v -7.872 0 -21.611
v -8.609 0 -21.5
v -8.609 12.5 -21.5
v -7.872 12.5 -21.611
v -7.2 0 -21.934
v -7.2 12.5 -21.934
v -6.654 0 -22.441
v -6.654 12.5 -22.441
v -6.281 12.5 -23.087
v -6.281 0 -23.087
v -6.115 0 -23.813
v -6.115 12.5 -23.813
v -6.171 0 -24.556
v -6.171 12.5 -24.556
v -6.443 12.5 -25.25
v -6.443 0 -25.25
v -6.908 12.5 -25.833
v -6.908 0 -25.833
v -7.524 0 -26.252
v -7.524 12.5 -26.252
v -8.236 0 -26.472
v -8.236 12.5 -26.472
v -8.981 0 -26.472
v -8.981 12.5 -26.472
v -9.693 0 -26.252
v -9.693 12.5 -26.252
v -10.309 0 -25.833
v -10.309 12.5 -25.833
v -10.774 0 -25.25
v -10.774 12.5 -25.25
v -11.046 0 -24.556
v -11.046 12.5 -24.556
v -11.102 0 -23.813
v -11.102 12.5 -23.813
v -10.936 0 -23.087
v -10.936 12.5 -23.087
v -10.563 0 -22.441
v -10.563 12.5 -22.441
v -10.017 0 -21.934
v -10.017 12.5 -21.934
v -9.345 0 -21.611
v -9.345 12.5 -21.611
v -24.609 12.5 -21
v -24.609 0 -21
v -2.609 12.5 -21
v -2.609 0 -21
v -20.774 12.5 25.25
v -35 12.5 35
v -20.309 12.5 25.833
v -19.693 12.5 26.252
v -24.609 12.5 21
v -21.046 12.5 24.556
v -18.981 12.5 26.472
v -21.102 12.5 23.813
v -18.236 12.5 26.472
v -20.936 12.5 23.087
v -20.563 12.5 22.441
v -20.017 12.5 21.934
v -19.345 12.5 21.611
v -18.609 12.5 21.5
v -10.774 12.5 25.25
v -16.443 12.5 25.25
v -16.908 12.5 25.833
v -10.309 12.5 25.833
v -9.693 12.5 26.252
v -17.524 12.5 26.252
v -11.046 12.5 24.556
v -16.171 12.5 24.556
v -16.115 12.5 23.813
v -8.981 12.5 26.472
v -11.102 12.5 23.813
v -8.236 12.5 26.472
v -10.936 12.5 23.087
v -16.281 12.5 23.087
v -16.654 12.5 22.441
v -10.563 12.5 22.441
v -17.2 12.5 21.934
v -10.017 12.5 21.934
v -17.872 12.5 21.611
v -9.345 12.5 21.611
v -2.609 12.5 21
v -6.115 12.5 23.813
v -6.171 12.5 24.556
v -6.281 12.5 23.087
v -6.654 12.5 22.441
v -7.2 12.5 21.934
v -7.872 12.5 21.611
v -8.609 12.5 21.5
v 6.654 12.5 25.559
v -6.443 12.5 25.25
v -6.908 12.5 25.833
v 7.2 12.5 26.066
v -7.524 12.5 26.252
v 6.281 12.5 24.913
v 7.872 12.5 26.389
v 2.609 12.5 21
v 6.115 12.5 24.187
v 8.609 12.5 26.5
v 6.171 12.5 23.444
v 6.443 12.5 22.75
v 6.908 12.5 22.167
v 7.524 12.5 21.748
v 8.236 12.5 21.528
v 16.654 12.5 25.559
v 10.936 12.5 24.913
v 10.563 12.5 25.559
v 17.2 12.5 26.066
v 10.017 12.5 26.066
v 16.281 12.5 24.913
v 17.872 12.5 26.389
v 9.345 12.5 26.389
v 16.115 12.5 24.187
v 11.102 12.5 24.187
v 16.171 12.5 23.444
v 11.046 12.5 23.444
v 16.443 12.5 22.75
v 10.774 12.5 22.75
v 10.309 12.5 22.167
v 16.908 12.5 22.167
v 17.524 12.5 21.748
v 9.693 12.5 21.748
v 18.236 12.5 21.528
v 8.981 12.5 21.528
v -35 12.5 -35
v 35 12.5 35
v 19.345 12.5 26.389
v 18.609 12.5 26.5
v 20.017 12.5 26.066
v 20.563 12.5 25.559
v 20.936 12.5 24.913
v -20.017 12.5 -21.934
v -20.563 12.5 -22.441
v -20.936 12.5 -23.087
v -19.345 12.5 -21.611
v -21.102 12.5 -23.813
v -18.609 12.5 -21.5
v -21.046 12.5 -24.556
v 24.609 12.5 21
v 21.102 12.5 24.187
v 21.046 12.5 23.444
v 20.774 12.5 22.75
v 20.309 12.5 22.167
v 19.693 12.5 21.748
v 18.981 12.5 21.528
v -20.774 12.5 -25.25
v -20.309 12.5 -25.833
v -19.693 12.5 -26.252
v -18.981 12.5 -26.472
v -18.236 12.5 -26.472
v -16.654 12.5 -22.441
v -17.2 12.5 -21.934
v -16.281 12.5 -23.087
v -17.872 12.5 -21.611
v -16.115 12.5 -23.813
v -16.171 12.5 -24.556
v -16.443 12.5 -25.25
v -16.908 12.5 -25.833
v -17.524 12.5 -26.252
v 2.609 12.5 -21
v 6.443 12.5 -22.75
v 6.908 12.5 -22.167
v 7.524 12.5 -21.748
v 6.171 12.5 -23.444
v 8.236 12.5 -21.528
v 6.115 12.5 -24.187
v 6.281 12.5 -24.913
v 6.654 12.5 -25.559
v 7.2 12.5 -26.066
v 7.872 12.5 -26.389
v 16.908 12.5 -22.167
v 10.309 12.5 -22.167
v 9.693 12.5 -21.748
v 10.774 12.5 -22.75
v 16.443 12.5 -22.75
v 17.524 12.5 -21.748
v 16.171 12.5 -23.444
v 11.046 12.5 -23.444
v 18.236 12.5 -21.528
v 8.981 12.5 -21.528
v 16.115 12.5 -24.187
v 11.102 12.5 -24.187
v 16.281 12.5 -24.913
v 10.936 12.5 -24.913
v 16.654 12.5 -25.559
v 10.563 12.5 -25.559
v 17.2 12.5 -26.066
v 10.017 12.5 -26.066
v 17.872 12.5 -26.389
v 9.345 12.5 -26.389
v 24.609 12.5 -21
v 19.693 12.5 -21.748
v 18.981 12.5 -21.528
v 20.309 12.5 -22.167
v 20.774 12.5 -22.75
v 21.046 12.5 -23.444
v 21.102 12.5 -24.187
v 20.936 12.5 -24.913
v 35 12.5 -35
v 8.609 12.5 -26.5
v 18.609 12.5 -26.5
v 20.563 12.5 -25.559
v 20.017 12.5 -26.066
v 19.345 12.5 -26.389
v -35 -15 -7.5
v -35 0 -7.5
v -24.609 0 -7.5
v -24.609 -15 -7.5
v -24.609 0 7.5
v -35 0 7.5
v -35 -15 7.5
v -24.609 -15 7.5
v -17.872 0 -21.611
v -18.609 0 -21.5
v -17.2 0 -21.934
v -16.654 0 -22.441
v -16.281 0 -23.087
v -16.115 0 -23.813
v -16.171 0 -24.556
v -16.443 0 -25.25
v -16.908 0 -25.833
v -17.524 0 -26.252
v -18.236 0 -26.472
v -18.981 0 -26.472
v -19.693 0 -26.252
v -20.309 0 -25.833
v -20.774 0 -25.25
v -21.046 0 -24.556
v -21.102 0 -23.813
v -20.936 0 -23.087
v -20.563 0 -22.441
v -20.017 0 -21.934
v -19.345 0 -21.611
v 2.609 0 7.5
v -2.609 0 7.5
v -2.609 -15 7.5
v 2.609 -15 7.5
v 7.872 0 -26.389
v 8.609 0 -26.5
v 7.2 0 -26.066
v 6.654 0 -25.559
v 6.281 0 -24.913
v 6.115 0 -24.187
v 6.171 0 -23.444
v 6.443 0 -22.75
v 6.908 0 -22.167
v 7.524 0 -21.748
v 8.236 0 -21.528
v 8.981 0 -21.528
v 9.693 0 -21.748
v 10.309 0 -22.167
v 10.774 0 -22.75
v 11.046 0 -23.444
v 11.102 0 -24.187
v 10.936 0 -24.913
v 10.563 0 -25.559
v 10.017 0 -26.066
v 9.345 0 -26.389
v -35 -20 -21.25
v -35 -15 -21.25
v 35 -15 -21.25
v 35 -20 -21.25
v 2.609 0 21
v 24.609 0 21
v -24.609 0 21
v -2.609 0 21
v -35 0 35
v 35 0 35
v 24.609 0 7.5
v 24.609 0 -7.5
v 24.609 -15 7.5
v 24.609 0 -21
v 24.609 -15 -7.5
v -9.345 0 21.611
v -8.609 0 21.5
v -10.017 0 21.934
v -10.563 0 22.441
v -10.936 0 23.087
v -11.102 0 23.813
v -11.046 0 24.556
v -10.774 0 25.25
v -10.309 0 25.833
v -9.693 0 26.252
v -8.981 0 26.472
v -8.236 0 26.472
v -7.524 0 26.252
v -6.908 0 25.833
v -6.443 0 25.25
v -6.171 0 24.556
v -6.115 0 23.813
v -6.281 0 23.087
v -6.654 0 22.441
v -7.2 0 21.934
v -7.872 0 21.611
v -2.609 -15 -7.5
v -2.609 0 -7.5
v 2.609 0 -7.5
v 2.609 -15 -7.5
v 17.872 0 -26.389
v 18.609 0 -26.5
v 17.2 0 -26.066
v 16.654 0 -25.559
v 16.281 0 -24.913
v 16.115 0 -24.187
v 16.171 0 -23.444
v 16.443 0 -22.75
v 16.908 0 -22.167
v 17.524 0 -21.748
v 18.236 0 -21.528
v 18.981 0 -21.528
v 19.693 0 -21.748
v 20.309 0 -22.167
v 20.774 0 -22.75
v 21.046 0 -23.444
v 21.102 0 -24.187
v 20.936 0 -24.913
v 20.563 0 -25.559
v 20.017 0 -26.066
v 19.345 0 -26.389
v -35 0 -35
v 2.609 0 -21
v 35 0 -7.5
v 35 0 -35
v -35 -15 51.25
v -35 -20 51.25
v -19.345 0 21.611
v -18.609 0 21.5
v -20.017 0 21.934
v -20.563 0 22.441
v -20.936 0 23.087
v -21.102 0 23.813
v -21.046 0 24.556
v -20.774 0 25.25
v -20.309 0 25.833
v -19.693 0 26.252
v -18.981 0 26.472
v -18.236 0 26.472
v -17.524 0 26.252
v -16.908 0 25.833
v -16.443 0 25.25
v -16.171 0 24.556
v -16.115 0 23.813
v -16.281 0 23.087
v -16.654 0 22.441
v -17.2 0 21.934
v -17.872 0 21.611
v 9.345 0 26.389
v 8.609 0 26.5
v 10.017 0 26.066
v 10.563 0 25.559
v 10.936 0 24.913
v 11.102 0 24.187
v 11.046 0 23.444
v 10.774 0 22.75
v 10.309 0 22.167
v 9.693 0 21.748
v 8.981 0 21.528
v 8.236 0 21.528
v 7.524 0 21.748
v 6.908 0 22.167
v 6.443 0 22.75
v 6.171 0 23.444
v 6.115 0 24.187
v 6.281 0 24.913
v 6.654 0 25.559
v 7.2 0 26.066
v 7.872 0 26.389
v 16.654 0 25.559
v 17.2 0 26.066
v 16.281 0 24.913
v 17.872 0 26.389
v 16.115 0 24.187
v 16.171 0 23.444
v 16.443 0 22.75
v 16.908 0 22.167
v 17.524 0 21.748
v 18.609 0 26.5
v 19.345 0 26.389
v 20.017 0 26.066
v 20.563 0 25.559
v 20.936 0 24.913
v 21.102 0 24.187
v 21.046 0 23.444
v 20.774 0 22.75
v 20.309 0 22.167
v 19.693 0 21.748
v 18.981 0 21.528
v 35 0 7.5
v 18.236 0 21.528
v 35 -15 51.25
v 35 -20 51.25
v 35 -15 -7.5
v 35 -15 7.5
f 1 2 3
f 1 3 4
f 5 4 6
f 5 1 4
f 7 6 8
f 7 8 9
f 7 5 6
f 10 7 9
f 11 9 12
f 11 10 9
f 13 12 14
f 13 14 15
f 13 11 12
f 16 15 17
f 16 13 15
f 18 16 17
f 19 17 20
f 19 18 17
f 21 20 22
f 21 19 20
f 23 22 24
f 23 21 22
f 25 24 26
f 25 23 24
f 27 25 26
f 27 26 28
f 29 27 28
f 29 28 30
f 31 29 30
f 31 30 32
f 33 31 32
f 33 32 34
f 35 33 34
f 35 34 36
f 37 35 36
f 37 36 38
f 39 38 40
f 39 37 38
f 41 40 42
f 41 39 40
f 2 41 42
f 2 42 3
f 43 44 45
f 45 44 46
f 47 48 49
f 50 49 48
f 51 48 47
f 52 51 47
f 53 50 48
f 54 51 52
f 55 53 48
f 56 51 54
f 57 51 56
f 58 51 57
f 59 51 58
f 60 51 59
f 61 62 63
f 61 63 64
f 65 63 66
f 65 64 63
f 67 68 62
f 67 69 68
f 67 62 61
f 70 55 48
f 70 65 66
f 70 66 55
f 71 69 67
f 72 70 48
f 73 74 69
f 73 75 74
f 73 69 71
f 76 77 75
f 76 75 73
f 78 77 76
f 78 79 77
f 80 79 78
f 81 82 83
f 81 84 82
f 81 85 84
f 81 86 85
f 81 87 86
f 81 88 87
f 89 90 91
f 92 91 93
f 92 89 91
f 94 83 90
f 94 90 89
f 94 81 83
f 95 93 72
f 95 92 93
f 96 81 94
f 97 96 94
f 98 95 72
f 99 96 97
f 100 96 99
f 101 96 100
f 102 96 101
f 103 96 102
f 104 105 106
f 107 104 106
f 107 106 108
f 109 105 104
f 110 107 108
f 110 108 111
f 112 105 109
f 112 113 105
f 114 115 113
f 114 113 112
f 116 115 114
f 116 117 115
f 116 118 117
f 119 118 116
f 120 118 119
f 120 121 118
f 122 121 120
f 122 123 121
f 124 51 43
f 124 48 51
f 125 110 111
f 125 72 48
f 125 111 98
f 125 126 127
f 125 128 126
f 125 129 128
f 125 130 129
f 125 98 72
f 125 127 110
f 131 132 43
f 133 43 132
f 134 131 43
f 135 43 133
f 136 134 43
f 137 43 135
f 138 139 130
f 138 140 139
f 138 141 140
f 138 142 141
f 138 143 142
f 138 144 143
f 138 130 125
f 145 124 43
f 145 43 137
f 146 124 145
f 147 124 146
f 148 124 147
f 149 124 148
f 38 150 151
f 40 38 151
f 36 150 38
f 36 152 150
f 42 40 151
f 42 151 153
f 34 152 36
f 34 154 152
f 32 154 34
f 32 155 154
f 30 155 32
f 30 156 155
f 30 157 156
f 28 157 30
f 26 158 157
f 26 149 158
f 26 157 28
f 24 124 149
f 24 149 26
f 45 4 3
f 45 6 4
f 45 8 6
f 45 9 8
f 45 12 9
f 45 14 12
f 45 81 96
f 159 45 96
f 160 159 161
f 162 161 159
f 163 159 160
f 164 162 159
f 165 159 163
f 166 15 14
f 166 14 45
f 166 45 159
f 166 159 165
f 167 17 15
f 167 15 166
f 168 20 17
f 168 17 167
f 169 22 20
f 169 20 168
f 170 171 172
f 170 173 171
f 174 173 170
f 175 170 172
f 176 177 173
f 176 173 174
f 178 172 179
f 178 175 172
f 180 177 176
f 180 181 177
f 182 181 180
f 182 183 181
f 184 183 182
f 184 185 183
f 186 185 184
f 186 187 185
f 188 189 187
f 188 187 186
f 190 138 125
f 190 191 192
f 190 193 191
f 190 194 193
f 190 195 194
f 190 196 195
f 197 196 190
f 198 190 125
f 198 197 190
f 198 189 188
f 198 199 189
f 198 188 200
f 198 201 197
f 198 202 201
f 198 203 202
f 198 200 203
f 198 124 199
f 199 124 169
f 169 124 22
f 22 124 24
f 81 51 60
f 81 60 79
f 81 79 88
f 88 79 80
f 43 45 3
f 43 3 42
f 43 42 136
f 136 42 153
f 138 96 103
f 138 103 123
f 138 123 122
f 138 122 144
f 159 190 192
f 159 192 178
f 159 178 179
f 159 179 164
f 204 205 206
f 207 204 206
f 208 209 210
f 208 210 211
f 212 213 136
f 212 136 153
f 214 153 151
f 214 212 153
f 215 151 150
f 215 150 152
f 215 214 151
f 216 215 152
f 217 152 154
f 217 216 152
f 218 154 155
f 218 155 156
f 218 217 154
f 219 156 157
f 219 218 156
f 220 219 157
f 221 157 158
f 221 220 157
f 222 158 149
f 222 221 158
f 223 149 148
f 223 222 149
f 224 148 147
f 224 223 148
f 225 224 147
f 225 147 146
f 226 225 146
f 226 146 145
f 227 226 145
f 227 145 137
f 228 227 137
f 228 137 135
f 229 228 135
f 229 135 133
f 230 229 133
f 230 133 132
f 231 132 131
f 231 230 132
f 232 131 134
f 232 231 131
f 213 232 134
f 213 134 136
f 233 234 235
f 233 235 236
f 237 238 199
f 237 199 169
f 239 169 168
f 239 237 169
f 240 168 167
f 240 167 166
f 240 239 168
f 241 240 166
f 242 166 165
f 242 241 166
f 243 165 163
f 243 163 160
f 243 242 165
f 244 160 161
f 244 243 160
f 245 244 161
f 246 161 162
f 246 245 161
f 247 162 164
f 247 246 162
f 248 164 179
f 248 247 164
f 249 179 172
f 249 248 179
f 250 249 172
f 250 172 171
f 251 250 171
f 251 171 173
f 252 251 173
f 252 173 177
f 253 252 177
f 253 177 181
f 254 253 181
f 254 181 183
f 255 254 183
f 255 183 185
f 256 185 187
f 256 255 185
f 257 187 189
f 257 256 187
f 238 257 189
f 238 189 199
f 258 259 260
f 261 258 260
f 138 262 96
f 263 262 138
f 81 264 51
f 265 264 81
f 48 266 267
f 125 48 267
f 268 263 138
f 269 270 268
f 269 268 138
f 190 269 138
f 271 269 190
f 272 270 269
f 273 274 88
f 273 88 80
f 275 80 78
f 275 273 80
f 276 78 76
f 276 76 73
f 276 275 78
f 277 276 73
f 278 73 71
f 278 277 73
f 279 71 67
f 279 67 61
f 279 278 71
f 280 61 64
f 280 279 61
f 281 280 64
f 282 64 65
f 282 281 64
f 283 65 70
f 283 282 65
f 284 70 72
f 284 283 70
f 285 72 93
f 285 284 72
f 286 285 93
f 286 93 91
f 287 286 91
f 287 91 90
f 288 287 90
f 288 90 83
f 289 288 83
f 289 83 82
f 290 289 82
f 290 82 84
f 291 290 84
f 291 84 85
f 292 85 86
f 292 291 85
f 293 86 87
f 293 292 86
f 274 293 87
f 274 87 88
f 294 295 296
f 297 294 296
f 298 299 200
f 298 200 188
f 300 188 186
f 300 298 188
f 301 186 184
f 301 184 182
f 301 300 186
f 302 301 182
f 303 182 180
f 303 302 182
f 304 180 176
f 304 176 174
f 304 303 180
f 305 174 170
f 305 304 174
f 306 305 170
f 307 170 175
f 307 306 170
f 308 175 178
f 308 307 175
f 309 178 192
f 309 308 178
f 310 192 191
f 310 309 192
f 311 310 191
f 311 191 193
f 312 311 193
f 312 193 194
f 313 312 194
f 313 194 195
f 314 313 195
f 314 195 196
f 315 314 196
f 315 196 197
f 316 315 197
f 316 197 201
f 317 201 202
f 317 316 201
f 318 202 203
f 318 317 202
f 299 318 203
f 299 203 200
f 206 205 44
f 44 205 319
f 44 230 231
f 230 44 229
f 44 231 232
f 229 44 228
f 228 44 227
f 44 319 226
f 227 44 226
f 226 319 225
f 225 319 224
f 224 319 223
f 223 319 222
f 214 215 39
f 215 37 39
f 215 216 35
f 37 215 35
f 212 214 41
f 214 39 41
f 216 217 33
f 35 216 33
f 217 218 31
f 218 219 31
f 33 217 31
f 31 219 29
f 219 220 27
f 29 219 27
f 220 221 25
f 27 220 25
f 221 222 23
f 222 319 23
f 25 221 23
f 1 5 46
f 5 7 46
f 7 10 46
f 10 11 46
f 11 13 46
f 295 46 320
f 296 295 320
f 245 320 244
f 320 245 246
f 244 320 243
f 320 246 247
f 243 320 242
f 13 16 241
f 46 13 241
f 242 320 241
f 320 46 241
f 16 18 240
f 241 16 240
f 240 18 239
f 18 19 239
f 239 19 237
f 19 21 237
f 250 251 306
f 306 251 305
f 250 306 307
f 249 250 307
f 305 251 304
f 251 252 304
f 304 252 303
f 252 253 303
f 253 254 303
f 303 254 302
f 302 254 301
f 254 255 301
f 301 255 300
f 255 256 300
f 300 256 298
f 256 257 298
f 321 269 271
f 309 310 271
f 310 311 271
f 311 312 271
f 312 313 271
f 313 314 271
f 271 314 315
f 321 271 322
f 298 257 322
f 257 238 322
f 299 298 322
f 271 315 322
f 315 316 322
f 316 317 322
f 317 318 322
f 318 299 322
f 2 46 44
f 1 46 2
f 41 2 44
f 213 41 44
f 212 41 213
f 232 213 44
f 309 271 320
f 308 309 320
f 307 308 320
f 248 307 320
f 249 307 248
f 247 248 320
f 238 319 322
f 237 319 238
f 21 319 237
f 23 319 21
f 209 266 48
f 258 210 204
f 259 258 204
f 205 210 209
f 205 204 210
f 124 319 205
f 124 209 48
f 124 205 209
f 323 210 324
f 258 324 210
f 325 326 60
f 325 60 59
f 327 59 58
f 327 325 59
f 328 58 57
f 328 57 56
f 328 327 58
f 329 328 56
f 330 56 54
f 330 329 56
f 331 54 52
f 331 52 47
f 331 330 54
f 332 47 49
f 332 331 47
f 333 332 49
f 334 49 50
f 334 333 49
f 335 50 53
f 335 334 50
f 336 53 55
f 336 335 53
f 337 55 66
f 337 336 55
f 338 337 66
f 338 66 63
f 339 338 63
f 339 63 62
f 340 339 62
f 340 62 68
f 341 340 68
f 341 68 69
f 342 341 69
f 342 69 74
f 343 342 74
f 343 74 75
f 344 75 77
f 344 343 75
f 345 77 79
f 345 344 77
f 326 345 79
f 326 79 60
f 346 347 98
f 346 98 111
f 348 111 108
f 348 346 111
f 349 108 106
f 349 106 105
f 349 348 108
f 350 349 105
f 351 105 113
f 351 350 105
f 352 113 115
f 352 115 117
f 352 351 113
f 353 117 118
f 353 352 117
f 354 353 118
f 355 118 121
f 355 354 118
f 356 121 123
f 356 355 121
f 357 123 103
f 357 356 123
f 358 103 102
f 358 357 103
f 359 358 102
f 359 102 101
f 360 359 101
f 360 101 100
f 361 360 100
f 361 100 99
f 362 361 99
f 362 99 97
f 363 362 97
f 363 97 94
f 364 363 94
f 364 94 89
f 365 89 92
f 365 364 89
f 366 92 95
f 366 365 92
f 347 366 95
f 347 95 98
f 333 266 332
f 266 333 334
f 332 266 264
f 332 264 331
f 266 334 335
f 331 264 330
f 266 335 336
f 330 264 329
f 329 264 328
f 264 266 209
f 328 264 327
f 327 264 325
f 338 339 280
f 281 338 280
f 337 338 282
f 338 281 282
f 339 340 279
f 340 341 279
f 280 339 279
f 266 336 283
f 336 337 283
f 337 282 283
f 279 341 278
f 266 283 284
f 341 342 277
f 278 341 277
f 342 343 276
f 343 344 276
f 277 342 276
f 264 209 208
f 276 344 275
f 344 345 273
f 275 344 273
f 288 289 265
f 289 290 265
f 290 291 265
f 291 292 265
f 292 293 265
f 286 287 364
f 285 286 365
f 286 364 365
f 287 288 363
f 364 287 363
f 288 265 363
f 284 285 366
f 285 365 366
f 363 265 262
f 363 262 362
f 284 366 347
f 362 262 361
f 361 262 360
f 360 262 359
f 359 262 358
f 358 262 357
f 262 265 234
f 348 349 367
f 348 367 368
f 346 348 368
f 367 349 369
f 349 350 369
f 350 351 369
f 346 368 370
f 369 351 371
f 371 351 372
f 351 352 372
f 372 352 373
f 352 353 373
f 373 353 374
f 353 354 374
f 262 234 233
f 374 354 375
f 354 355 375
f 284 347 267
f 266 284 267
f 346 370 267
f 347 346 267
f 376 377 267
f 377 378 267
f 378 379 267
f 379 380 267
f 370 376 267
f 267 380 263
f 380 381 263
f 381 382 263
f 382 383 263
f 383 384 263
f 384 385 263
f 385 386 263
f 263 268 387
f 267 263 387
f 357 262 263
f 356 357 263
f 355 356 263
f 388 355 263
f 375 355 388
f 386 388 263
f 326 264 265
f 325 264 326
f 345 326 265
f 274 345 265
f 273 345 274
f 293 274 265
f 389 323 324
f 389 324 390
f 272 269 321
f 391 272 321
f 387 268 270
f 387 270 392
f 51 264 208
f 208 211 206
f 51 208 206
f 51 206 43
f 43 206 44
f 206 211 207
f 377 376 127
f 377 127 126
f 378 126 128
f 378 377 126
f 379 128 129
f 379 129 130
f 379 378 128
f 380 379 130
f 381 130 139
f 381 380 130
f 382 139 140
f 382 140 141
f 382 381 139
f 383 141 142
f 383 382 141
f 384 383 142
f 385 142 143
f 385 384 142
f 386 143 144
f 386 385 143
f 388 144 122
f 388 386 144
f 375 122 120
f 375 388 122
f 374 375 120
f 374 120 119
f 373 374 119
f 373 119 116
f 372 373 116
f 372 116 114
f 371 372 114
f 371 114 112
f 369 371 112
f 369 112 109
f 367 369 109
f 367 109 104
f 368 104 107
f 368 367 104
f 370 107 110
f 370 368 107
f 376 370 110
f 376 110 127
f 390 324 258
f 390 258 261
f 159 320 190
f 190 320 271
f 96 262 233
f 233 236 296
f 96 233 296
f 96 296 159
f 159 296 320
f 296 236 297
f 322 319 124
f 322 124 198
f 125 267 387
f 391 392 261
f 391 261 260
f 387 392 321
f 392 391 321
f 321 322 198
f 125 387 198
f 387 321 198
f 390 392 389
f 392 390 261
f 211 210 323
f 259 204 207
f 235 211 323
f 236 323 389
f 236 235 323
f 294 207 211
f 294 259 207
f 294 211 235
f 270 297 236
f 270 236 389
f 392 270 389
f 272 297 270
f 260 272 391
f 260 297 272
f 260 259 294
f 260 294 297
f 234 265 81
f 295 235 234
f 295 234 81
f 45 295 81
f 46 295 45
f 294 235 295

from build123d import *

# Parameters (mm, degrees)
SKETCH1_W           = 70
SKETCH1_H           = 70
SKETCH1_R           = 2.5
SKETCH1_W_2         = 22
SKETCH1_H_2         = 42
BOSS_EXTRUDE1_DEPTH = 12.5
SKETCH3_W           = 10.391499035
SKETCH3_H           = 15
SKETCH3_W_2         = 5.21700193
BOSS_EXTRUDE2_DEPTH = 15
SKETCH8_W           = 70
SKETCH8_H           = 42.5
BOSS_EXTRUDE5_DEPTH = 5
SKETCH12_W          = 70
SKETCH12_H          = 5
BOSS_EXTRUDE6_DEPTH = 30


with BuildPart() as part:
    # Sketch1 → Boss-Extrude1 (new body)
    with BuildSketch(Plane(origin=(0, 0, 0), x_dir=(1, 0, 0), z_dir=(0, 1, 0))):
        Rectangle(SKETCH1_W, SKETCH1_H)
        with Locations(Location((-18.608500965, 24, 0), (0, 0, 270))):
            Circle(SKETCH1_R, mode=Mode.SUBTRACT)
        with Locations(Location((-8.608500965, 24, 0), (0, 0, 270))):
            Circle(SKETCH1_R, mode=Mode.SUBTRACT)
        with Locations(Location((-8.608500965, -24, 0), (0, 0, 90))):
            Circle(SKETCH1_R, mode=Mode.SUBTRACT)
        with Locations(Location((-18.608500965, -24, 0), (0, 0, 90))):
            Circle(SKETCH1_R, mode=Mode.SUBTRACT)
        with Locations(Location((8.608500965, -24, 0), (0, 0, 270))):
            Circle(SKETCH1_R, mode=Mode.SUBTRACT)
        with Locations(Location((18.608500965, -24, 0), (0, 0, 270))):
            Circle(SKETCH1_R, mode=Mode.SUBTRACT)
        with Locations(Location((8.608500965, 24, 0), (0, 0, 90))):
            Circle(SKETCH1_R, mode=Mode.SUBTRACT)
        with Locations(Location((18.608500965, 24, 0), (0, 0, 90))):
            Circle(SKETCH1_R, mode=Mode.SUBTRACT)
        with Locations((-13.608500965, 0)):
            Rectangle(SKETCH1_W_2, SKETCH1_H_2, mode=Mode.SUBTRACT)
        with Locations((13.608500965, 0)):
            Rectangle(SKETCH1_W_2, SKETCH1_H_2, mode=Mode.SUBTRACT)
    extrude(amount=BOSS_EXTRUDE1_DEPTH)

    # Sketch3 → Boss-Extrude2 (add)
    with BuildSketch(Plane.XZ):
        with Locations((-29.804250483, 0)):
            Rectangle(SKETCH3_W, SKETCH3_H)
        Rectangle(SKETCH3_W_2, SKETCH3_H)
        with Locations((29.804250483, 0)):
            Rectangle(SKETCH3_W, SKETCH3_H)
    extrude(amount=BOSS_EXTRUDE2_DEPTH)

    # Sketch8 → Boss-Extrude5 (add)
    with BuildSketch(Plane.XZ.offset(15)):
        Rectangle(SKETCH8_W, SKETCH8_H)
    extrude(amount=BOSS_EXTRUDE5_DEPTH)

    # Sketch12 → Boss-Extrude6 (add)
    with BuildSketch(Plane.XY.offset(21.25)):
        with Locations((0, -17.5)):
            Rectangle(SKETCH12_W, SKETCH12_H)
    extrude(amount=BOSS_EXTRUDE6_DEPTH)


solid = part.part
